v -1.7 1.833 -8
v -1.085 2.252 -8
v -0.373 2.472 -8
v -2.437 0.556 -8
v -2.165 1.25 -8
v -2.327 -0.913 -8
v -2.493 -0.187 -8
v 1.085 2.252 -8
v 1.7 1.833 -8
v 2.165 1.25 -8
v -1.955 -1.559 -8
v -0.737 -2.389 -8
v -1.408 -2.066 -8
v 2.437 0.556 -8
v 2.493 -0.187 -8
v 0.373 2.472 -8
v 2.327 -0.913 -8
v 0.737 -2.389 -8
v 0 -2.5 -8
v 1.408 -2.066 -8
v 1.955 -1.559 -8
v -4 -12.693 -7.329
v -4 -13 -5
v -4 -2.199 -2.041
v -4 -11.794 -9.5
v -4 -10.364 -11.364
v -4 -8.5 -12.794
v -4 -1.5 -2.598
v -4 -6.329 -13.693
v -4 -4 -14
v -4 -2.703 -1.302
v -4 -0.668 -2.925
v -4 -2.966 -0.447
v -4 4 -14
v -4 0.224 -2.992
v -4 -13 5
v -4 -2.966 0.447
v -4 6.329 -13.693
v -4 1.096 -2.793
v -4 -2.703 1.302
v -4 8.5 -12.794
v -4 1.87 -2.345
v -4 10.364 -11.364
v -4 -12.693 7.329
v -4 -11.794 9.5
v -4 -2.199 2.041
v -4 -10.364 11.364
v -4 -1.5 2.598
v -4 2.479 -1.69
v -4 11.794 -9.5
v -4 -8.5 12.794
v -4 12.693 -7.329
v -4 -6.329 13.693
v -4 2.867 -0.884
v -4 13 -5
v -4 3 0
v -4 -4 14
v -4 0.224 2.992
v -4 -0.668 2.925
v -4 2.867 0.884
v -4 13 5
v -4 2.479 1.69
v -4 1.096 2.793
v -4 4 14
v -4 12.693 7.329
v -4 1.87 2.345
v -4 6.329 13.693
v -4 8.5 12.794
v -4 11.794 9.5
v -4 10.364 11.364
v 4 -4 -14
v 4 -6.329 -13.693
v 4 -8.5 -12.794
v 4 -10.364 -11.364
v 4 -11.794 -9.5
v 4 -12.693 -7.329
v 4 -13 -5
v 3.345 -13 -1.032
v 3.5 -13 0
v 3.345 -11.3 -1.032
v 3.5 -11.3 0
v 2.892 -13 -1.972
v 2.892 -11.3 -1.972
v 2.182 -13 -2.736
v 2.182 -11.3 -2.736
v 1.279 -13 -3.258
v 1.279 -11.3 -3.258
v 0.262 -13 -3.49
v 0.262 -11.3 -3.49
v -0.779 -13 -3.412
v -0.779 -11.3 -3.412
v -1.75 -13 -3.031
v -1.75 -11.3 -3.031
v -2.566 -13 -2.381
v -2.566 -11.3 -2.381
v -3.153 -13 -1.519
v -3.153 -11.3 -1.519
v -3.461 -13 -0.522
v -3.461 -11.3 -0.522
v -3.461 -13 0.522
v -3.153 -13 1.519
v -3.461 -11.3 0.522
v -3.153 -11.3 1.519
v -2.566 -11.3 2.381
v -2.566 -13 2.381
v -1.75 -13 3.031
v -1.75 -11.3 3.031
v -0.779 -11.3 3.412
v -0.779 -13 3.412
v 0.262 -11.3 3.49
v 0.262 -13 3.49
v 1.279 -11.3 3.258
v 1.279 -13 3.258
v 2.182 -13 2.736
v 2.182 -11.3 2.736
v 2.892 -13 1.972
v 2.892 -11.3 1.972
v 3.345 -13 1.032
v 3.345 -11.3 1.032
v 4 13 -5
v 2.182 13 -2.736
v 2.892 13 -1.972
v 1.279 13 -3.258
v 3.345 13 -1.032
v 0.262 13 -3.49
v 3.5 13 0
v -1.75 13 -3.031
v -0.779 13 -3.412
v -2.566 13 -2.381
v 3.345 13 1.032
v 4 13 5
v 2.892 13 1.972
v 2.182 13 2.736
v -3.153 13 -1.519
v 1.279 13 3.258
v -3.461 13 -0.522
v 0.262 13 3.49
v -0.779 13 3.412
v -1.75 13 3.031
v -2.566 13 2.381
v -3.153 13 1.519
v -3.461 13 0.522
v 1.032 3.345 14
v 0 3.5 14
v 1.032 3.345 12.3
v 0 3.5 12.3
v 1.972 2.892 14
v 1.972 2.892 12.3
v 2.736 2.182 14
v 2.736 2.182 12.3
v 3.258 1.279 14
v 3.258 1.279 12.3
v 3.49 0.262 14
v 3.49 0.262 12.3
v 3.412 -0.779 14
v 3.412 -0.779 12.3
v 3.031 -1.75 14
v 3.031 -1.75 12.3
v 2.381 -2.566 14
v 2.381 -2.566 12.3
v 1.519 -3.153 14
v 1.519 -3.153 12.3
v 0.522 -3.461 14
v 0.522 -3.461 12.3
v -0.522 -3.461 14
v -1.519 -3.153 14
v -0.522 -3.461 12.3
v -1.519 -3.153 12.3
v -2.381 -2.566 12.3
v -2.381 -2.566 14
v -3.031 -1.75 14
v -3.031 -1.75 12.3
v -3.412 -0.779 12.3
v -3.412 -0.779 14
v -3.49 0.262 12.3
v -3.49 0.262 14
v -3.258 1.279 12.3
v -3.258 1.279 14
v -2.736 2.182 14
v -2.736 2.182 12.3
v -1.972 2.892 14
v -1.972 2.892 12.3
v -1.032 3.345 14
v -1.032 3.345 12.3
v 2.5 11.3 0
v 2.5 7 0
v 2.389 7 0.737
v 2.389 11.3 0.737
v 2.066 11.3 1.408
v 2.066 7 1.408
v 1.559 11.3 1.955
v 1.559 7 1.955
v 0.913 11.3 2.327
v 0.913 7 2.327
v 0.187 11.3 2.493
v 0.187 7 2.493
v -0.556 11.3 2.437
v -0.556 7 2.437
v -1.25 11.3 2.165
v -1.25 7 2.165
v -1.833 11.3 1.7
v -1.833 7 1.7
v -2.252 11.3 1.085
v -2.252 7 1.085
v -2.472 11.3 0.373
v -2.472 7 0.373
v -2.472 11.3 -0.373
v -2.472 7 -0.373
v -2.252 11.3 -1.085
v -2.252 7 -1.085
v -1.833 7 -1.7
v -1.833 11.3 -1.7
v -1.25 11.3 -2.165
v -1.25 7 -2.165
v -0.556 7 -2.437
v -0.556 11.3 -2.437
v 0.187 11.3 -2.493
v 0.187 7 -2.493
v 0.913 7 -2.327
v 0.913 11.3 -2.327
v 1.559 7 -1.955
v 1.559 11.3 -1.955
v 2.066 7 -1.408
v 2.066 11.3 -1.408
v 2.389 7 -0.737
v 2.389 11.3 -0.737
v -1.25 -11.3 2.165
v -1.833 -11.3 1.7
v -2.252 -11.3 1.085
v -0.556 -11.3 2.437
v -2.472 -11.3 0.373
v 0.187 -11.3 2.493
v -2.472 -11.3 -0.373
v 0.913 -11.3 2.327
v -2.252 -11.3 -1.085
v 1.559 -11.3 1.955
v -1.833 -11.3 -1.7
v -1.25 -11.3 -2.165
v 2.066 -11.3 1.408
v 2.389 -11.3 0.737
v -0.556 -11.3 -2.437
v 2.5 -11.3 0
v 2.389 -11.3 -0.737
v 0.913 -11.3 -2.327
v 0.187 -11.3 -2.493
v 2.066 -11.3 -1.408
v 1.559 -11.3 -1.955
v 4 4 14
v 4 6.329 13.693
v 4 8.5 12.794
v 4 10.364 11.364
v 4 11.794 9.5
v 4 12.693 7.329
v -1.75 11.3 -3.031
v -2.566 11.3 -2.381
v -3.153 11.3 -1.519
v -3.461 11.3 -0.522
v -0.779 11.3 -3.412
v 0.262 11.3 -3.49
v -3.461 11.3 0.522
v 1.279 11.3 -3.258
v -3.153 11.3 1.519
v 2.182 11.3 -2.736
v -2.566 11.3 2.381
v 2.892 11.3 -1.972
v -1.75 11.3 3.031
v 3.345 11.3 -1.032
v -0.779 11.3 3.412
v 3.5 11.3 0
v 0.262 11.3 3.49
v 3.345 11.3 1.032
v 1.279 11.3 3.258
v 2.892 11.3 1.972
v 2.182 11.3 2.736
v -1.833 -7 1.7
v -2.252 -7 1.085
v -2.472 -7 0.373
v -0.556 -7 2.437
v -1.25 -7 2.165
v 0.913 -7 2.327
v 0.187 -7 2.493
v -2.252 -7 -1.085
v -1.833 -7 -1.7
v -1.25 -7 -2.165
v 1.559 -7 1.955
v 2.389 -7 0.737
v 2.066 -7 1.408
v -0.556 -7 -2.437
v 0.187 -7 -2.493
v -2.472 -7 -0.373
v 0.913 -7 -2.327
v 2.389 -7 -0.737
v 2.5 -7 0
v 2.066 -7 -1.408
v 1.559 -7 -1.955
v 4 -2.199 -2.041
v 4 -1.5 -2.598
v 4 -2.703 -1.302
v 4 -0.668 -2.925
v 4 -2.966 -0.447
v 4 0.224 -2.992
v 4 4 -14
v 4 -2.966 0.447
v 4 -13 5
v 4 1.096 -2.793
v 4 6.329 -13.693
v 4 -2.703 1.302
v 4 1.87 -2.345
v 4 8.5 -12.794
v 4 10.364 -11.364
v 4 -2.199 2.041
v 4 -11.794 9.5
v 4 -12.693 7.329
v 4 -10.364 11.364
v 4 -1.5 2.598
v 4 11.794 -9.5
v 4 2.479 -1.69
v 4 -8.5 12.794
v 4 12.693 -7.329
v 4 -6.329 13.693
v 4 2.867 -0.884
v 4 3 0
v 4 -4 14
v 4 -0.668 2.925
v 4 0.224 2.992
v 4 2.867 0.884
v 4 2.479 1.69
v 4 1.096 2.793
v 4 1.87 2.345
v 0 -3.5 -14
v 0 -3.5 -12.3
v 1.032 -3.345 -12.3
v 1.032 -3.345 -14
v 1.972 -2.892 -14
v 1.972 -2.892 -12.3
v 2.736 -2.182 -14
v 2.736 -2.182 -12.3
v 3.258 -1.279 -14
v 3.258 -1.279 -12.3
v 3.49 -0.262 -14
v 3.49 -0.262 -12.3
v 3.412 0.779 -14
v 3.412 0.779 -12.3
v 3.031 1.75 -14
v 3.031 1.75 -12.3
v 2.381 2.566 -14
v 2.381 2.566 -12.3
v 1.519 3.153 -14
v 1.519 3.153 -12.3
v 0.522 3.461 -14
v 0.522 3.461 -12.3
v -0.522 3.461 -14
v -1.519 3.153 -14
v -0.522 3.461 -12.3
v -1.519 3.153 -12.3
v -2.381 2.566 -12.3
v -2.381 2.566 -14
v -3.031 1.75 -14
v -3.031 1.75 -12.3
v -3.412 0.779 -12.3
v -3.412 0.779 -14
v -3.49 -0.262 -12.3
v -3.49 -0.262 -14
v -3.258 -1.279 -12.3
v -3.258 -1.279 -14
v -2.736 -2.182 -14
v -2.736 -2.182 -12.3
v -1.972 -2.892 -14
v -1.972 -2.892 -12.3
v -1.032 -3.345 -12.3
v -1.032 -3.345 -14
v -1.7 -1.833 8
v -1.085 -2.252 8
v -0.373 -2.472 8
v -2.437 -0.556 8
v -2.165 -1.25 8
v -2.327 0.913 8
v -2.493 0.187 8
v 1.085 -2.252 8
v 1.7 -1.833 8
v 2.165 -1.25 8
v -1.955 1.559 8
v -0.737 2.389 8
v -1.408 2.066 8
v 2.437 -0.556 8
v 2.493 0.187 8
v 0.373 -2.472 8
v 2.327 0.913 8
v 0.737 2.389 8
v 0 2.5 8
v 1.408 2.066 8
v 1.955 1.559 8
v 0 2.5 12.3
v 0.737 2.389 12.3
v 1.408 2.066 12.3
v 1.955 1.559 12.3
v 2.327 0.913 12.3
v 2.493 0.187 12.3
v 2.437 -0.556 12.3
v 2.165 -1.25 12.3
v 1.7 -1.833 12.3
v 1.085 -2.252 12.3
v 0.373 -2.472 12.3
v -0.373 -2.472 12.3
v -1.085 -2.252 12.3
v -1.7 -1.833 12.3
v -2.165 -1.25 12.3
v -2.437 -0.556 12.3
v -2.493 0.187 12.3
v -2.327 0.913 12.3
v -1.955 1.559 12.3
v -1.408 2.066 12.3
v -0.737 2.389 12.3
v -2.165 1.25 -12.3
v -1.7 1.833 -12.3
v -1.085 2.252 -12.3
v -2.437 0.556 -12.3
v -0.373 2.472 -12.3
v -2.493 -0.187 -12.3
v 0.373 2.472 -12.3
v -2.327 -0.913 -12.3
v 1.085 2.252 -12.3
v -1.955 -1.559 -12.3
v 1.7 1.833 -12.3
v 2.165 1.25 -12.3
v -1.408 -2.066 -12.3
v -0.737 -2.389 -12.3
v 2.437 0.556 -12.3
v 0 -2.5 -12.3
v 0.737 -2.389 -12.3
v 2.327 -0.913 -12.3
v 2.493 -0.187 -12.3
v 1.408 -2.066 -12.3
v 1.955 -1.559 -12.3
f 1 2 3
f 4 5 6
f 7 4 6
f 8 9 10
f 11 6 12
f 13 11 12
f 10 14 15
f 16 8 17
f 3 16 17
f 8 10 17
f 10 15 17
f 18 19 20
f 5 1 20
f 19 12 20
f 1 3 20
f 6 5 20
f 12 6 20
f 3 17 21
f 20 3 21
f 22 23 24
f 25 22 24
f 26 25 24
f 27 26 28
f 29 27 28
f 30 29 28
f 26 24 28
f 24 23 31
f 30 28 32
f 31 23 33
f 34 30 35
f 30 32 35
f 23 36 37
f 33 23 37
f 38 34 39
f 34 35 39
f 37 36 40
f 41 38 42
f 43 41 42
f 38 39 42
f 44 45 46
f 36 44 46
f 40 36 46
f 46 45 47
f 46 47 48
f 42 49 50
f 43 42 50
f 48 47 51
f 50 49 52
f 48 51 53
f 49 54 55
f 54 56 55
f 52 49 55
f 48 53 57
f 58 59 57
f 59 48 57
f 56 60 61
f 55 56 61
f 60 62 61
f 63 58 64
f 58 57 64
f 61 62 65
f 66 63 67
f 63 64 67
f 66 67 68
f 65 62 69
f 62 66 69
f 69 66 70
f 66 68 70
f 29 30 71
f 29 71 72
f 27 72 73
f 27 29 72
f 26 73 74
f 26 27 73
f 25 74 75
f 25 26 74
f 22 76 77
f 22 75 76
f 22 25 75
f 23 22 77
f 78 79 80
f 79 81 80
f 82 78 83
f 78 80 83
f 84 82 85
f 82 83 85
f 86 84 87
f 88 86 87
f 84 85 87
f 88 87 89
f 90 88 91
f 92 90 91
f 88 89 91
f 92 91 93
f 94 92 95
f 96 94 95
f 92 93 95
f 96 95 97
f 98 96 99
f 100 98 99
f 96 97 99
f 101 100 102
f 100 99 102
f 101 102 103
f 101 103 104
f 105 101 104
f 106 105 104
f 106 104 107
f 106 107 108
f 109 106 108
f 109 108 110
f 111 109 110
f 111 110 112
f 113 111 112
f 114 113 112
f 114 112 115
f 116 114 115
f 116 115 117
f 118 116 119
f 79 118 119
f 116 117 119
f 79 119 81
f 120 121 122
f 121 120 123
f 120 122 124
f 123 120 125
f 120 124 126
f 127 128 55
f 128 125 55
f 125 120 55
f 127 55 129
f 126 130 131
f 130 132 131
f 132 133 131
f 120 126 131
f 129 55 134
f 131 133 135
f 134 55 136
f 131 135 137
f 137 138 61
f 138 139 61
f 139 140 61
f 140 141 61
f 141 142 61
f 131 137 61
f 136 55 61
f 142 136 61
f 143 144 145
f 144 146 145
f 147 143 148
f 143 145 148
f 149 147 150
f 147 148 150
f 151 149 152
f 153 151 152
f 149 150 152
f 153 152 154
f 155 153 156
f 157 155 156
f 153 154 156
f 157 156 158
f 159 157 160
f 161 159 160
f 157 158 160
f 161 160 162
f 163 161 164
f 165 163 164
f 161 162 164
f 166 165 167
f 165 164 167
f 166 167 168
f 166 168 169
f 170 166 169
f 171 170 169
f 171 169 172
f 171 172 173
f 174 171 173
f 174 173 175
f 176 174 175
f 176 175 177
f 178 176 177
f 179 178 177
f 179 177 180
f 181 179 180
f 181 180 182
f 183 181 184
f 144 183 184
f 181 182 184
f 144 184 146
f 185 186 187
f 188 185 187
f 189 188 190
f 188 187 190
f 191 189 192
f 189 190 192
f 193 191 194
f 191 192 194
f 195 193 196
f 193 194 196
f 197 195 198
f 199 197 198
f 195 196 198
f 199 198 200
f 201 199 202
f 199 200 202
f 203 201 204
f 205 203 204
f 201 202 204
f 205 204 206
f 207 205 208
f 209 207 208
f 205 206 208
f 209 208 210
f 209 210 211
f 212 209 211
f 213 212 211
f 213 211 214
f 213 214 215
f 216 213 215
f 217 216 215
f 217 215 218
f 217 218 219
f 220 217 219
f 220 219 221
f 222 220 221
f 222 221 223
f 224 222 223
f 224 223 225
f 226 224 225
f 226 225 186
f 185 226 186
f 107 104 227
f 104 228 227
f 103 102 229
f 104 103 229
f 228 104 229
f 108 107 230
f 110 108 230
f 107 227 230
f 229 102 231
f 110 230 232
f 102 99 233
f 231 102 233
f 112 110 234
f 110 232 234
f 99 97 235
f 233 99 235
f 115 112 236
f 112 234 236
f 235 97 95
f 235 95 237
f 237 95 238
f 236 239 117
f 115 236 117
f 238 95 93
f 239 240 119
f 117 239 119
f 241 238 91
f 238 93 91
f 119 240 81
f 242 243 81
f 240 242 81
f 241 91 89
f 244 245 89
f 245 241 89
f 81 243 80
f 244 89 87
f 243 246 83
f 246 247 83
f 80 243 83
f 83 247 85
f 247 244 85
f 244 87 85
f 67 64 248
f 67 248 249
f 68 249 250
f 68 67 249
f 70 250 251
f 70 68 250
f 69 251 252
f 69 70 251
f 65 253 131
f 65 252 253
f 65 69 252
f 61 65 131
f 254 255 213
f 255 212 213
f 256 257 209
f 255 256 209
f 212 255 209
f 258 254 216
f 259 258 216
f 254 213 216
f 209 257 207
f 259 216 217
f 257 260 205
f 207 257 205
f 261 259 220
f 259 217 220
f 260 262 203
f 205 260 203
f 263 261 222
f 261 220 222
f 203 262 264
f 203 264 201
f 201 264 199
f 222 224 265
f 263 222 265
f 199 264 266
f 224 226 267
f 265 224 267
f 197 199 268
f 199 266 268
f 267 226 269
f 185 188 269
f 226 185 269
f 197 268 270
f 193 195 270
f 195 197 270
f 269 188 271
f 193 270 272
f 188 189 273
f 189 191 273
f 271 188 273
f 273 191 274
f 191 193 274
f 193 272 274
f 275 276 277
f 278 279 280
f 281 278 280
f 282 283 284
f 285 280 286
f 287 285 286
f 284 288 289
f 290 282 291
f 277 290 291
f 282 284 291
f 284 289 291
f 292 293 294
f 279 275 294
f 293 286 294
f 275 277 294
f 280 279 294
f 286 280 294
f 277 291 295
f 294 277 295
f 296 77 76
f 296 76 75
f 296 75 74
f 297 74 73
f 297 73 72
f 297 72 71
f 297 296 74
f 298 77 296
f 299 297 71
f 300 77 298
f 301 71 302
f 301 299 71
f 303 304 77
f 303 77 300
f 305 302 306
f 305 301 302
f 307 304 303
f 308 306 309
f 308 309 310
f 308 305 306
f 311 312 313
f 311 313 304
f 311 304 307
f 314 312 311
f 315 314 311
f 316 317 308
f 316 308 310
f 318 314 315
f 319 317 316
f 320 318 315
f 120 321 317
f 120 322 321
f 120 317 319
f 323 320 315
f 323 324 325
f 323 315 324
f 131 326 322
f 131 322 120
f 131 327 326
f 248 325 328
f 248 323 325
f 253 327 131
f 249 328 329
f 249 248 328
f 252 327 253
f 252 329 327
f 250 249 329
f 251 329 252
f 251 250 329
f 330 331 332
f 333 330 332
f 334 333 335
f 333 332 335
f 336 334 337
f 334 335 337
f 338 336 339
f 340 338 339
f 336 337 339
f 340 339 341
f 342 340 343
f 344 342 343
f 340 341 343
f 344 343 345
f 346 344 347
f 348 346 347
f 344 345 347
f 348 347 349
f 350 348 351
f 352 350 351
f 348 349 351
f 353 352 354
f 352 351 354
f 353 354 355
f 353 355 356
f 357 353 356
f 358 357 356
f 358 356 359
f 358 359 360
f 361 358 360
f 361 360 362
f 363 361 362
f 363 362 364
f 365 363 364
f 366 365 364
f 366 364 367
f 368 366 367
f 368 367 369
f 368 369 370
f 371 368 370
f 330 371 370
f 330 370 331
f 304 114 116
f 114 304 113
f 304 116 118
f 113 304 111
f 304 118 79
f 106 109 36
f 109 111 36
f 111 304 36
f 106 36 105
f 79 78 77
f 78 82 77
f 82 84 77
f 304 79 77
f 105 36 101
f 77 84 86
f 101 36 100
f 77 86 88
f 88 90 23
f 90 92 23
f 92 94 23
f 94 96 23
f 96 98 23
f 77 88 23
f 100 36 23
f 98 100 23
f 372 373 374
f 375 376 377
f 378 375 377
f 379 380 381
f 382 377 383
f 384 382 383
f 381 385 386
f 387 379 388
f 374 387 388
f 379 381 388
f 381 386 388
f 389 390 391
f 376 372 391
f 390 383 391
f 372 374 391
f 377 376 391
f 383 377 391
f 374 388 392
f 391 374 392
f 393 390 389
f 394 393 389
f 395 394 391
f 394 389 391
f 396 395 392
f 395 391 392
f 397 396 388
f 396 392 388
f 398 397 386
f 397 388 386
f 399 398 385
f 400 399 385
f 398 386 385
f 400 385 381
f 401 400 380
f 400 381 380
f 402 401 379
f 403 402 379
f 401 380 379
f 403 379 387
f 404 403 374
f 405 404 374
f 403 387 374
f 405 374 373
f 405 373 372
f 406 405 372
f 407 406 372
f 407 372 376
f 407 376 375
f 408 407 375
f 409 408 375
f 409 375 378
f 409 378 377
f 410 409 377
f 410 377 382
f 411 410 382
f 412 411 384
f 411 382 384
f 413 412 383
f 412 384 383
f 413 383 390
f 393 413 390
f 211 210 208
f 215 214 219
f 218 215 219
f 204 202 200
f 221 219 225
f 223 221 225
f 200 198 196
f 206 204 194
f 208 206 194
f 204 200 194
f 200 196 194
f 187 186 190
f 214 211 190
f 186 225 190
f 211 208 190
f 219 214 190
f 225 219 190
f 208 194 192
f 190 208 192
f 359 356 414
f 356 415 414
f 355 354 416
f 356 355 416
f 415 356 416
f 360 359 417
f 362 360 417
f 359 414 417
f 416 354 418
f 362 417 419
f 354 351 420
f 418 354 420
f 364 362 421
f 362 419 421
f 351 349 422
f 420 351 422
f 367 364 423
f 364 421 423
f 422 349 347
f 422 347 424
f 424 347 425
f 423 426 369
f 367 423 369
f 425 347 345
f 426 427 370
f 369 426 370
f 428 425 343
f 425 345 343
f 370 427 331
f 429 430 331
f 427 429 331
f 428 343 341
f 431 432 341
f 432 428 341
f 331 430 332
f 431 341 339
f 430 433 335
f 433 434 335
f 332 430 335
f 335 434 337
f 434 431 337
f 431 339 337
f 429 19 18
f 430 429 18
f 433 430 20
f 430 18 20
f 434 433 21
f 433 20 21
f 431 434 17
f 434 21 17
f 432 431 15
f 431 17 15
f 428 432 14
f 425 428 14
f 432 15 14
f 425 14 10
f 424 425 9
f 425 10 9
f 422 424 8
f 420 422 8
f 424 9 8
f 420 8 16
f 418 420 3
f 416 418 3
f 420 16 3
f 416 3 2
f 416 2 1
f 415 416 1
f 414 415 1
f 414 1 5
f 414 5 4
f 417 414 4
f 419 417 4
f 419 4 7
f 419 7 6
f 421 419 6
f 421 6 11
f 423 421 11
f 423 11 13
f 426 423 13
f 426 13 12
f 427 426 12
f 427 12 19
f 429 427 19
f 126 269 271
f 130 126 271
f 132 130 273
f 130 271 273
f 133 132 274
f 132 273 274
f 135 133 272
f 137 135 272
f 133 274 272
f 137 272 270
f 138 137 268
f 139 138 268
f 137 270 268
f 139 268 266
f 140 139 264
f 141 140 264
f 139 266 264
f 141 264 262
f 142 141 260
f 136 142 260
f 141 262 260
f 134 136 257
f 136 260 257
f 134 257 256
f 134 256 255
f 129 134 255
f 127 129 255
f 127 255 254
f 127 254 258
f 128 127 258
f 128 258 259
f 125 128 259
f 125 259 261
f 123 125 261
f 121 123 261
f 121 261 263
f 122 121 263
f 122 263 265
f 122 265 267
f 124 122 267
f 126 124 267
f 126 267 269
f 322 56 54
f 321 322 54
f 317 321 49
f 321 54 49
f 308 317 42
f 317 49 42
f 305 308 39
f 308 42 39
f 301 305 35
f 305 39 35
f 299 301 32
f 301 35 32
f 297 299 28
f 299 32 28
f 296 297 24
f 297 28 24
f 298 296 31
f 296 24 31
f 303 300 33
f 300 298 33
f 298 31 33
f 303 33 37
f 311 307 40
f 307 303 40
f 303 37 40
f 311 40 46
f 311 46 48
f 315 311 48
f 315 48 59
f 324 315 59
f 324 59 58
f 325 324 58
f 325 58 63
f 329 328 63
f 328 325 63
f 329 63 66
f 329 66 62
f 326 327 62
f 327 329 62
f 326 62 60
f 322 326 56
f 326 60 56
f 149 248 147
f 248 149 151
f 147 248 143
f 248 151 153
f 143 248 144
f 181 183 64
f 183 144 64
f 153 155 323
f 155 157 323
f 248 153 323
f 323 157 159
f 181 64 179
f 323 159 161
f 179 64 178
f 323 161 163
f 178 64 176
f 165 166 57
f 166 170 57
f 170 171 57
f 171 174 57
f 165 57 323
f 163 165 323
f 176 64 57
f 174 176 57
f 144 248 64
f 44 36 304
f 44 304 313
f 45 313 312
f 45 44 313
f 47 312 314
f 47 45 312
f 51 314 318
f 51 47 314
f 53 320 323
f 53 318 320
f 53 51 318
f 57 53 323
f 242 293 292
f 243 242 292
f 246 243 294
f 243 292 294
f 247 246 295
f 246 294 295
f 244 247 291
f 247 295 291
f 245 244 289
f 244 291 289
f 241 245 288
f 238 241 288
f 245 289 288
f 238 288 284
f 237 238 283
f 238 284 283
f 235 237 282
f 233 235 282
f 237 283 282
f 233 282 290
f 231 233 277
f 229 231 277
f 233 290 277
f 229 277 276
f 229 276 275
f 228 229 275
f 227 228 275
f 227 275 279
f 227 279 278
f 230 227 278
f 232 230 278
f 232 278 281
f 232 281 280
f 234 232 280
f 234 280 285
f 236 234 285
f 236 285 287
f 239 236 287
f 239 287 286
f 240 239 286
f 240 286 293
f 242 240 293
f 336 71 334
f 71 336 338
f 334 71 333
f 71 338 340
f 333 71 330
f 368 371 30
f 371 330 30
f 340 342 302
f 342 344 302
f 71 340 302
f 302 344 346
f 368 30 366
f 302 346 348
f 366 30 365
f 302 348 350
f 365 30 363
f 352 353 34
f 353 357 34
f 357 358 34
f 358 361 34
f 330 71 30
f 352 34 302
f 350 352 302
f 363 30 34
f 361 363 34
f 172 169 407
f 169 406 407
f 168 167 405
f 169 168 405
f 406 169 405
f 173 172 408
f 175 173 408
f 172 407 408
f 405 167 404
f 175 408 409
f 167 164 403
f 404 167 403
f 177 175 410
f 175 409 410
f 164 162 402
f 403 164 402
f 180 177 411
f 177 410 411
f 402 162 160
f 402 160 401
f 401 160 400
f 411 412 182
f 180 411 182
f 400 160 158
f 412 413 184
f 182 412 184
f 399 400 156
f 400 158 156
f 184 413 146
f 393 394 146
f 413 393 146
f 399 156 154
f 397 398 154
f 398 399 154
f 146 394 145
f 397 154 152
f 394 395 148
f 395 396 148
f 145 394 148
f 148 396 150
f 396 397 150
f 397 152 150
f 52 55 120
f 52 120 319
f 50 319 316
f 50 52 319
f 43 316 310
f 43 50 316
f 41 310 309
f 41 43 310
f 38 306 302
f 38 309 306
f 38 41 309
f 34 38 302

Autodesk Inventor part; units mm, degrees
ref_plane "YZ Plane" through (0, 0, 0) normal (1, 0, 0) x (0, 1, 0)
ref_plane "XZ Plane" through (0, 0, 0) normal (0, 1, 0) x (-1, 0, 0)
ref_plane "XY Plane" through (0, 0, 0) normal (0, 0, 1) x (1, 0, 0)
sketch "草圖4" plane through (0, 0, 0) normal (1, 0, 0) x (0, 1, 0)
  line L0 (4, 14) -> (-4, 14)
  line L1 (-13, 5) -> (-13, -5)
  line L2 (-4, -14) -> (4, -14)
  line L3 (13, -5) -> (13, 5)
  arc A0 (13, 5) -> (4, 14) centre (4, 5) ccw
  arc A1 (4, -14) -> (13, -5) centre (4, -5) ccw
  arc A2 (-13, -5) -> (-4, -14) centre (-4, -5) ccw
  arc A3 (-4, 14) -> (-13, 5) centre (-4, 5) ccw
  circle A4 centre (0, 0) radius 3
  point P0 (-13, -14)
  point P1 (-13, 14)
  point P2 (13, -14)
  point P3 (0, 14)
  point P4 (13, 0)
  dimension "d13" = 26
  dimension "d14" = 28
  dimension "d15" = 9
  dimension "d23" = 6
extrude "擠出1" add sketch "草圖4" along normal mid plane 8
sketch "草圖3" plane through (0, 0, 0) normal (0, 0, 1) x (1, 0, 0)
  line L0 (0, 13) -> (3.5, 13)
  line L1 (3.5, 13) -> (3.5, 11.3)
  line L2 (3.5, 11.3) -> (2.5, 11.3)
  line L3 (2.5, 11.3) -> (2.5, 7)
  line L4 (2.5, 7) -> (0, 7)
  line L5 (0, 13) -> (0, 7)
  line L6 (4, 13) -> (-4, 13) construction
  point P0 (0, 0)
  dimension "d5" = 1.7
  dimension "d6" = 7
  dimension "d7" = 6
  dimension "d8" = 5
revolve "迴轉2" cut sketch "草圖3" angle 360 about axis through (0, 13, 0) along (0, -1, 0)
sketch "草圖5" plane through (0, 0, 0) normal (1, 0, 0) x (0, 1, 0)
  line L0 (0, 14) -> (3.5, 14)
  line L1 (3.5, 14) -> (3.5, 12.3)
  line L2 (3.5, 12.3) -> (2.5, 12.3)
  line L3 (2.5, 12.3) -> (2.5, 8)
  line L4 (2.5, 8) -> (0, 8)
  line L5 (0, 14) -> (0, 8)
  line L6 (-4, 14) -> (4, 14) construction
  point P0 (0, 0)
  point P1 (0, 0)
  dimension "d18" = 1.7
  dimension "d19" = 7
  dimension "d20" = 6
  dimension "d21" = 5
revolve "迴轉3" cut sketch "草圖5" angle 360 about axis through (0, 0, 14) along (0, 0, -1)
pattern_circular "環形陣列1" count 2 over 360 about axis through (-10, 0, 0) along (1, 0, 0) of "迴轉2", "迴轉3"
properties part number "限位塊" material "SS41"
